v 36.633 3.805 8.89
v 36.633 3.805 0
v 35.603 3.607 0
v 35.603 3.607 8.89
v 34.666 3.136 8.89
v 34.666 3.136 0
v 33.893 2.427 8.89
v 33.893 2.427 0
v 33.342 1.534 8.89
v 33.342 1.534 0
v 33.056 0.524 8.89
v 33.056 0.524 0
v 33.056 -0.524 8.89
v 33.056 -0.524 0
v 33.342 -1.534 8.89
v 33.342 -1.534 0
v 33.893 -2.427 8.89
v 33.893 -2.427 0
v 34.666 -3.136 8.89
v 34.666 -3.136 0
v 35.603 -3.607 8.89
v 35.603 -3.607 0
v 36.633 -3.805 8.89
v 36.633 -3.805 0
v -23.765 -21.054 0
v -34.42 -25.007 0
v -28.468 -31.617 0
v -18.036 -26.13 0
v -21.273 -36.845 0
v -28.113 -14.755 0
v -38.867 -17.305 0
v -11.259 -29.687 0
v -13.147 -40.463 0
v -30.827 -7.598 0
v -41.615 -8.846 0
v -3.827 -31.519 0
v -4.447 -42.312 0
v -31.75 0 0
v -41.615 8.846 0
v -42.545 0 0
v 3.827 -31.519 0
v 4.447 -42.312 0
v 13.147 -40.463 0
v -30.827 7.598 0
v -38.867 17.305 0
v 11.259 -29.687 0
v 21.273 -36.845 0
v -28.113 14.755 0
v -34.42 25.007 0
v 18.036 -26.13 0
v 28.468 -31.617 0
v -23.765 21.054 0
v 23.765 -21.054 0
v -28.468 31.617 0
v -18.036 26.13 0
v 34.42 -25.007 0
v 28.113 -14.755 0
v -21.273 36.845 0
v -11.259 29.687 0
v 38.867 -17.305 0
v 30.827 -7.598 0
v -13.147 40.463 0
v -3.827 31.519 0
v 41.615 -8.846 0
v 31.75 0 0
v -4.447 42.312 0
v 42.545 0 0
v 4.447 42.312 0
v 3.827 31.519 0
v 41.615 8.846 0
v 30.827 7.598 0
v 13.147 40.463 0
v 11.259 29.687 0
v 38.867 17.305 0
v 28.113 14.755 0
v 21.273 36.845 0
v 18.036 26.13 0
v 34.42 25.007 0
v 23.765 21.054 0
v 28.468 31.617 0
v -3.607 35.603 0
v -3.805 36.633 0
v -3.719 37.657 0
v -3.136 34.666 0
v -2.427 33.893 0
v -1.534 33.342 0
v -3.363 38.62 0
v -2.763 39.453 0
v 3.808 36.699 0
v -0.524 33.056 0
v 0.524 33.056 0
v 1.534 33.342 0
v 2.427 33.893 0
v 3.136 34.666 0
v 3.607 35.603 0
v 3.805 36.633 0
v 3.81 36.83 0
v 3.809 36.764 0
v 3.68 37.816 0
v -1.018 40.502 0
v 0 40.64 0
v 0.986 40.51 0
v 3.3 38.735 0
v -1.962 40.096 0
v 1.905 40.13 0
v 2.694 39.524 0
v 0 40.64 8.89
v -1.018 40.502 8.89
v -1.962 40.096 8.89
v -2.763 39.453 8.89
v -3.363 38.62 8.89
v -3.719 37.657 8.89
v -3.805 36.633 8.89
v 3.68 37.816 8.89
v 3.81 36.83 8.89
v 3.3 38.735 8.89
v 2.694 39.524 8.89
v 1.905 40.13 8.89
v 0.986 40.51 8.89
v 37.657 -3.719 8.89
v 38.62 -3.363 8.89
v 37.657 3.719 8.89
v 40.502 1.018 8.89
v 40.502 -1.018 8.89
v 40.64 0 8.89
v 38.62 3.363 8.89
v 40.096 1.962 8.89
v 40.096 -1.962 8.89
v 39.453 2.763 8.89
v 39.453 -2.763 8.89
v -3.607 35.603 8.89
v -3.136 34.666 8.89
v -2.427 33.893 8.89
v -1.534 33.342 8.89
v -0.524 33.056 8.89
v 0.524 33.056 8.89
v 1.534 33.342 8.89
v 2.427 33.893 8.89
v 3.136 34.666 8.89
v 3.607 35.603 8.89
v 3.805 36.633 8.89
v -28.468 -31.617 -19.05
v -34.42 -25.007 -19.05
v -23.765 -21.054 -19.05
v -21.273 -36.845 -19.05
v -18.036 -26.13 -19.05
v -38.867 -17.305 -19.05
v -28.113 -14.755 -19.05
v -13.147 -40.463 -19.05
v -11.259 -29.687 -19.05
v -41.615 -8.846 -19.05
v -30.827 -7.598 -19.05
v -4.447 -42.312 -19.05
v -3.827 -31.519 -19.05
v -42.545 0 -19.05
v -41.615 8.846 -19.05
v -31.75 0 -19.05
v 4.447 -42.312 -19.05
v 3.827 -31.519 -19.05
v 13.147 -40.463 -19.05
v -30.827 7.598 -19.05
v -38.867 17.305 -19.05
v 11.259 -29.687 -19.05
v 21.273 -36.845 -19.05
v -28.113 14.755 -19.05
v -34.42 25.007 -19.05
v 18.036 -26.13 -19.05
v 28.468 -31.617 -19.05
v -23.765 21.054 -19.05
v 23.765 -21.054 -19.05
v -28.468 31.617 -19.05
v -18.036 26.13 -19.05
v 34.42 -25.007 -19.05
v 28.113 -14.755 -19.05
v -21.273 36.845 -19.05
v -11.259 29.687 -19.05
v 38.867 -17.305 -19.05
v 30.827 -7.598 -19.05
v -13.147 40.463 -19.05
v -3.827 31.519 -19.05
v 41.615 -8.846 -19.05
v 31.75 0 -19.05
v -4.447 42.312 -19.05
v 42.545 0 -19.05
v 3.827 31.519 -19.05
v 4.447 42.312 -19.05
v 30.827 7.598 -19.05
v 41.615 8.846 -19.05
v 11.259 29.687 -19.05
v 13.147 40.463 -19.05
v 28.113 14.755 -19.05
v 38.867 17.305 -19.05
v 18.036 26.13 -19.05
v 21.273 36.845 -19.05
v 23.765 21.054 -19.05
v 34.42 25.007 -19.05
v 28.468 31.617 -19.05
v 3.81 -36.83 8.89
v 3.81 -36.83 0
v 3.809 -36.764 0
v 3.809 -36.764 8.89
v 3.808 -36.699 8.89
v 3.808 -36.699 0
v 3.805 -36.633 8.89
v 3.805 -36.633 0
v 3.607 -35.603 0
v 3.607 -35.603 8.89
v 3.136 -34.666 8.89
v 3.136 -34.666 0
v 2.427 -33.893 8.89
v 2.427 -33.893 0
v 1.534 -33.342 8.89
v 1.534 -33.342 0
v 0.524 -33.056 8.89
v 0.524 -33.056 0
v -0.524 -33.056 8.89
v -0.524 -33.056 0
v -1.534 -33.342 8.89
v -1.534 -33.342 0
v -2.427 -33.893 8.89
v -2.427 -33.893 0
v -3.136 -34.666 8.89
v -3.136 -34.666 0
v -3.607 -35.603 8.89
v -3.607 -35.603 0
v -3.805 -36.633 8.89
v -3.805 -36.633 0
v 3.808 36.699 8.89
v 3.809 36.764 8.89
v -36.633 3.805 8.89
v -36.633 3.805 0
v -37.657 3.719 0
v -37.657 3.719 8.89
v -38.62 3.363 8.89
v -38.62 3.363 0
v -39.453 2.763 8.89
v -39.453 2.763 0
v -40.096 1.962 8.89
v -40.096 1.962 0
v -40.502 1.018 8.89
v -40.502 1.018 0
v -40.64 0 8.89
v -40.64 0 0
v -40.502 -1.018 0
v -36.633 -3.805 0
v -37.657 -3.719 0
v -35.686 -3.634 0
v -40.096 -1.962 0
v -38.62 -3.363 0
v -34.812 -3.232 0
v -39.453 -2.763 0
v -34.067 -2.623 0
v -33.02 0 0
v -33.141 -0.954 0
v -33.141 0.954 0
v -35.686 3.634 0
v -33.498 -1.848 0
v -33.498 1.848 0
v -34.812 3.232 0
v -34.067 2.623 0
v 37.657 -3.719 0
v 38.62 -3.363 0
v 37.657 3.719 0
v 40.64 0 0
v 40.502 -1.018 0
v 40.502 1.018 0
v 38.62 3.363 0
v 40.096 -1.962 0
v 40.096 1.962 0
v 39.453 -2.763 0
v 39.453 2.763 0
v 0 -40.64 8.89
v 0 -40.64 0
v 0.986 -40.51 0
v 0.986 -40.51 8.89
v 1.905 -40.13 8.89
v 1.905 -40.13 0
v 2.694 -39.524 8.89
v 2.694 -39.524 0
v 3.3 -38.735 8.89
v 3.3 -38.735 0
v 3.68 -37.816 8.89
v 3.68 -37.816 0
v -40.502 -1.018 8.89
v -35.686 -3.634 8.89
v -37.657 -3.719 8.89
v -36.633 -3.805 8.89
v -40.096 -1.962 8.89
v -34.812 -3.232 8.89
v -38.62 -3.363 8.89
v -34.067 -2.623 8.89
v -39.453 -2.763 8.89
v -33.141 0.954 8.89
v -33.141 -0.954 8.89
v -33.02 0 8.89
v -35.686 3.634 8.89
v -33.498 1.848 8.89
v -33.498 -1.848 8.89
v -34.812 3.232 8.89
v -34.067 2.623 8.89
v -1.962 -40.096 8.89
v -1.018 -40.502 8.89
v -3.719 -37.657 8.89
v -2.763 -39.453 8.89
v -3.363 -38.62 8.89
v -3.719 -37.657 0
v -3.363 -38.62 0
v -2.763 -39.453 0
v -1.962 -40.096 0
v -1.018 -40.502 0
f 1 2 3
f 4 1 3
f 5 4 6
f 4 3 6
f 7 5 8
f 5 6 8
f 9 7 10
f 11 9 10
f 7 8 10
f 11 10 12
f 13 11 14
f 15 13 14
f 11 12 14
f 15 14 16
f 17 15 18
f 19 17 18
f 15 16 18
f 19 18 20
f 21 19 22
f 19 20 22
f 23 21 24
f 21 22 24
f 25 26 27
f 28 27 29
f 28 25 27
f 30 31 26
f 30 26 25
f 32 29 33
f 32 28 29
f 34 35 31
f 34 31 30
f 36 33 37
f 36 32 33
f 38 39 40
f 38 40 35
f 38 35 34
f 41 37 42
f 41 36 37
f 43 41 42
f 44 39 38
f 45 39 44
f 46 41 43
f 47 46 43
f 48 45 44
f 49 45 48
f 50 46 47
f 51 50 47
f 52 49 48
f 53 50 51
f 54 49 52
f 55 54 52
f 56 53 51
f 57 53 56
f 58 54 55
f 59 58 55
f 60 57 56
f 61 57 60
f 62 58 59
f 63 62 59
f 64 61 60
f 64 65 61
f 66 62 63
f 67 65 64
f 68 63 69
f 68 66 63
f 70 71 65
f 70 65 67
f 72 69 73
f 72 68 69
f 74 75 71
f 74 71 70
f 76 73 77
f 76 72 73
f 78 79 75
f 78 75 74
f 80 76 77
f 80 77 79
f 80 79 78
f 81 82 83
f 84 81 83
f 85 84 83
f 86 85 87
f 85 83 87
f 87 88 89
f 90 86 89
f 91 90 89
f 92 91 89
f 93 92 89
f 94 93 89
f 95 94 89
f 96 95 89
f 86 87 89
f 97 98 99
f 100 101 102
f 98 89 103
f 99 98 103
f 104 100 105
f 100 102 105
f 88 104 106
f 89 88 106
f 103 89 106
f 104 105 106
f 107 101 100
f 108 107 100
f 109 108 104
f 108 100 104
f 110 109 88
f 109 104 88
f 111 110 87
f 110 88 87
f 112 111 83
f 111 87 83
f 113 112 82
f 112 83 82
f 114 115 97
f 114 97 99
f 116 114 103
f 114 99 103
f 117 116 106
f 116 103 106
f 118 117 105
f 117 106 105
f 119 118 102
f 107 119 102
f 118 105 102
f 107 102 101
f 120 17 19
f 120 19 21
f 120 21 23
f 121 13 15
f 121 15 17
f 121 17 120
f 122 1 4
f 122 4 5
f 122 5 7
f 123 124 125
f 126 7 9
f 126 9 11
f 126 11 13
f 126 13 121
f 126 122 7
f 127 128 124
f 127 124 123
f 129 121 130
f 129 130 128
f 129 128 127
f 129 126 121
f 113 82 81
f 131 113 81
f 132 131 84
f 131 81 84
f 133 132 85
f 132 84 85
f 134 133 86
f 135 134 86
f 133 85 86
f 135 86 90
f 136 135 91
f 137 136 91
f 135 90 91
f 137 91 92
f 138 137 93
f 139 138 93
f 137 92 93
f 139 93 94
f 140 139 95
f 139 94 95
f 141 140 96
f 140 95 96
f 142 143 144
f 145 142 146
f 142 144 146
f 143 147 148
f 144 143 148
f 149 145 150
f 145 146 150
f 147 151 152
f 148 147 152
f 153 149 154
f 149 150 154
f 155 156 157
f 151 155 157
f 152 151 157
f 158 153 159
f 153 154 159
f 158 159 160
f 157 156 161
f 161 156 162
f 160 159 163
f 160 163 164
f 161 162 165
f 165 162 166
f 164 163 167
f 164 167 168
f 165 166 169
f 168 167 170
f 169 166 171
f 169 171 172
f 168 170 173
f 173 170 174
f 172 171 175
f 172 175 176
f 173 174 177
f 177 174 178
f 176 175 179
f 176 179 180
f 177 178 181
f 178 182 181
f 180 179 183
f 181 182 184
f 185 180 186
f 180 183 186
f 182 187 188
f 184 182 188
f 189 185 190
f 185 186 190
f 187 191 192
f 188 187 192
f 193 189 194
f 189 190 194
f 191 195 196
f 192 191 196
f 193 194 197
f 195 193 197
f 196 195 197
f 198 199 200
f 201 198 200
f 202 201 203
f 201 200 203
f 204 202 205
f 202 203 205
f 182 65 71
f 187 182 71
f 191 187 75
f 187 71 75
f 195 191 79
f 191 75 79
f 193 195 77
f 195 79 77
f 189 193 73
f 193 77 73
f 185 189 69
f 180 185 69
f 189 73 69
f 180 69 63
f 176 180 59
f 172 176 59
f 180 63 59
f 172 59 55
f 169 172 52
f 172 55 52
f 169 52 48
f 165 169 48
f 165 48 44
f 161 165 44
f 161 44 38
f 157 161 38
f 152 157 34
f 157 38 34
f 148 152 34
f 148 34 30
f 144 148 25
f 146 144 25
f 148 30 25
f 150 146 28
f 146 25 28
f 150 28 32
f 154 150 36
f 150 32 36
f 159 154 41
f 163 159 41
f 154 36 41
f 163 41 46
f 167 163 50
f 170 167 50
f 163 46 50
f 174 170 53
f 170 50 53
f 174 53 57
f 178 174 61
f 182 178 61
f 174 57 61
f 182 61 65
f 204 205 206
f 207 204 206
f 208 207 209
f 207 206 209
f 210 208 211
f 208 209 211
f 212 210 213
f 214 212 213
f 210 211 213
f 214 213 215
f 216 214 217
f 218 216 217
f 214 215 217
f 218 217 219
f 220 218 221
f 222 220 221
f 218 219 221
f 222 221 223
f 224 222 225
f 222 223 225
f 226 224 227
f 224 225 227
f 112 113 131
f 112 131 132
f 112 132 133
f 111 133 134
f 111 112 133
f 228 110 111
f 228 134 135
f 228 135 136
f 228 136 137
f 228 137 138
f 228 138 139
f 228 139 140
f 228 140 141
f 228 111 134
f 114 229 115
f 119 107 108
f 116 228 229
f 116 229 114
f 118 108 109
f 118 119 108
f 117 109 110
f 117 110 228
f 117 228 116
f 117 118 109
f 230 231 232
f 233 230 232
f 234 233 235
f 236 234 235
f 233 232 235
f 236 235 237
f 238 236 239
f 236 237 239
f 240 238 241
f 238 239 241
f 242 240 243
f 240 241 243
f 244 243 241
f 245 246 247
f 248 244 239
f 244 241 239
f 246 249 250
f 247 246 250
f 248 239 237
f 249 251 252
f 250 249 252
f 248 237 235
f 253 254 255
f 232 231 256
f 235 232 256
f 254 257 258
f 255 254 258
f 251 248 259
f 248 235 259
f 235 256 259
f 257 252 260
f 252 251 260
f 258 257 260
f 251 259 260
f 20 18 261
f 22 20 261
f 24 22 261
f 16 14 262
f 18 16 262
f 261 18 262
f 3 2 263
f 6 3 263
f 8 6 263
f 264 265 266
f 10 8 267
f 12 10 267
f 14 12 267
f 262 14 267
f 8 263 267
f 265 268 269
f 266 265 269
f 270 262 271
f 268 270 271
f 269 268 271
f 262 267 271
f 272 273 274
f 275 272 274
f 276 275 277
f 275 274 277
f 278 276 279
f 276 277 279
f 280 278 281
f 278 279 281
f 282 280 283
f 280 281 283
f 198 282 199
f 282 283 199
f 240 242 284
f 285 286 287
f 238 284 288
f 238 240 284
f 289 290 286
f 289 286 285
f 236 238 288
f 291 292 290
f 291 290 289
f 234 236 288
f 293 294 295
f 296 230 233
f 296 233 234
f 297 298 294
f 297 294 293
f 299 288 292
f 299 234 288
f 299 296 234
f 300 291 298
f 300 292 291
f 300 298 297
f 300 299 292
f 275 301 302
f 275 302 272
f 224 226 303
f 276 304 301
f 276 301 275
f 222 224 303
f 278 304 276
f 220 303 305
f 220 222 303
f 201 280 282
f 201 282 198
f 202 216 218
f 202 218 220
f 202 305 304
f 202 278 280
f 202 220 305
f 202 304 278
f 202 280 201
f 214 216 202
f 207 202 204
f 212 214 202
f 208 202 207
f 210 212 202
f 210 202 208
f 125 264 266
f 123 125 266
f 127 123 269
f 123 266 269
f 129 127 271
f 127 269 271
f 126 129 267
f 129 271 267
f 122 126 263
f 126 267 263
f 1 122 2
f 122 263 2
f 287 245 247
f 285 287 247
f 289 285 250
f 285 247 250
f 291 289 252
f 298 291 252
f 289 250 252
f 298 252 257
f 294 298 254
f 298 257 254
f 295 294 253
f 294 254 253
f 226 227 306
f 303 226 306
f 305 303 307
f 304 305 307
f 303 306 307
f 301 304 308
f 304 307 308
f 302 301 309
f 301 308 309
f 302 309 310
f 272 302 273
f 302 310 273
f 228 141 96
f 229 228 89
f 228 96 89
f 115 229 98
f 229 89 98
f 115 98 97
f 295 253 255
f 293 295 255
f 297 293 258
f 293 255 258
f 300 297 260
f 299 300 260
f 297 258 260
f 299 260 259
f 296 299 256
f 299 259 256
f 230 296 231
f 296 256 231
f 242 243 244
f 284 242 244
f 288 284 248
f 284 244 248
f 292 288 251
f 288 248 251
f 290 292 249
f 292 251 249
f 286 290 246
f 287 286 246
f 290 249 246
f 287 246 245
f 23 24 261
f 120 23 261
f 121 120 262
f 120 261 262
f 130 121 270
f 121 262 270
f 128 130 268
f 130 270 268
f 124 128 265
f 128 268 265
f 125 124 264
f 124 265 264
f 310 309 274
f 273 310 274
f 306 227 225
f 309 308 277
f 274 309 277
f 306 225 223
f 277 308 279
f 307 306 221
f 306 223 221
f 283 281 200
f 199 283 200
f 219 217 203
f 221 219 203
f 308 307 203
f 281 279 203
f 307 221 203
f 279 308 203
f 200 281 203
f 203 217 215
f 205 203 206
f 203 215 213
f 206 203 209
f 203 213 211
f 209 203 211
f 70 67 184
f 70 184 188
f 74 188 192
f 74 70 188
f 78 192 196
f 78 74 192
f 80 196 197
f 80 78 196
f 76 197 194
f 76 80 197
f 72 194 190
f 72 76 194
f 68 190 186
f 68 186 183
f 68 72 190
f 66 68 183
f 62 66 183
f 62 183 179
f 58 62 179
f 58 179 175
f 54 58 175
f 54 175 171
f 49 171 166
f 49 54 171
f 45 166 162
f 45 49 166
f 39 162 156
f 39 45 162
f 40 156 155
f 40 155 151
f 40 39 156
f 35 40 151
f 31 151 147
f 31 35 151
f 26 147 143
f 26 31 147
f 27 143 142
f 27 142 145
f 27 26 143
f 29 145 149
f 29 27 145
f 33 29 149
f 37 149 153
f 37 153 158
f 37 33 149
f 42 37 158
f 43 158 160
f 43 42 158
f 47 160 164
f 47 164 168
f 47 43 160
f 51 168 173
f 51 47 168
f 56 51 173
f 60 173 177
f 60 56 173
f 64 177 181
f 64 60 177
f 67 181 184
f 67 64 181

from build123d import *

# Parameters (mm, degrees)
F1_DEPTH = 8.89
F0_R     = 42.545
F0_R_2   = 31.75
F2_DEPTH = 19.05


with BuildPart() as f1:
    # F0 (on Top) → F1 (new body)
    with BuildSketch(Plane.XY):
        with BuildLine():
            ThreePointArc((3.81, 36.83), (2.6940768363, 39.5240768363), (0, 40.64))
            ThreePointArc((0, 40.64), (-2.7628728489, 39.4534773909), (-3.8048999754, 36.6329310345))
            ThreePointArc((-3.8048999754, 36.6329310345), (0, 36.83), (3.8048999754, 36.6329310345))
            ThreePointArc((3.8048999754, 36.6329310345), (3.8087247804, 36.7314325264), (3.81, 36.83))
        make_face()
        with BuildLine():
            ThreePointArc((3.8048999754, 36.6329310345), (0, 36.83), (-3.8048999754, 36.6329310345))
            ThreePointArc((-3.8048999754, 36.6329310345), (0, 33.02), (3.8048999754, 36.6329310345))
        make_face()
    extrude(amount=F1_DEPTH)


with BuildPart() as f1b:
    # F0 (on Top) → F1, piece 2 (new body)
    with BuildSketch(Plane.XY):
        with BuildLine():
            ThreePointArc((-33.02, 0), (-34.0671271511, 2.6234773909), (-36.6329310345, 3.8048999754))
            ThreePointArc((-36.6329310345, 3.8048999754), (-36.83, 0), (-36.6329310345, -3.8048999754))
            ThreePointArc((-36.6329310345, -3.8048999754), (-34.0671271511, -2.6234773909), (-33.02, 0))
        make_face()
        with BuildLine():
            ThreePointArc((-36.6329310345, 3.8048999754), (-39.4534773924, 2.7628728475), (-40.64, -4.1e-09))
            ThreePointArc((-40.64, -4.1e-09), (-39.4534773894, -2.7628728503), (-36.6329310345, -3.8048999754))
            ThreePointArc((-36.6329310345, -3.8048999754), (-36.83, 0), (-36.6329310345, 3.8048999754))
        make_face()
    extrude(amount=F1_DEPTH)


with BuildPart() as f1c:
    # F0 (on Top) → F1, piece 3 (new body)
    with BuildSketch(Plane.XY):
        with BuildLine():
            ThreePointArc((36.83, 0), (36.7806997622, 1.905), (36.6329310345, 3.8048999754))
            ThreePointArc((36.6329310345, 3.8048999754), (33.02, 0), (36.6329310345, -3.8048999754))
            ThreePointArc((36.6329310345, -3.8048999754), (36.7806997622, -1.905), (36.83, 0))
        make_face()
        with BuildLine():
            ThreePointArc((36.6329310345, -3.8048999754), (39.4534773909, -2.7628728489), (40.64, 0))
            ThreePointArc((40.64, 0), (39.4534773909, 2.7628728489), (36.6329310345, 3.8048999754))
            ThreePointArc((36.6329310345, 3.8048999754), (36.7806997622, 1.905), (36.83, 0))
            ThreePointArc((36.83, 0), (36.7806997622, -1.905), (36.6329310345, -3.8048999754))
        make_face()
    extrude(amount=F1_DEPTH)


with BuildPart() as f1d:
    # F0 (on Top) → F1, piece 4 (new body)
    with BuildSketch(Plane.XY):
        with BuildLine():
            ThreePointArc((3.8048999754, -36.6329310345), (0, -33.02), (-3.8048999754, -36.6329310345))
            ThreePointArc((-3.8048999754, -36.6329310345), (0, -36.83), (3.8048999754, -36.6329310345))
        make_face()
        with BuildLine():
            ThreePointArc((-3.8048999754, -36.6329310345), (-2.7628728415, -39.4534773987), (2.15e-08, -40.64))
            ThreePointArc((2.15e-08, -40.64), (2.6940768439, -39.5240768287), (3.81, -36.83))
            ThreePointArc((3.81, -36.83), (3.8087247804, -36.7314325264), (3.8048999754, -36.6329310345))
            ThreePointArc((3.8048999754, -36.6329310345), (0, -36.83), (-3.8048999754, -36.6329310345))
        make_face()
    extrude(amount=F1_DEPTH)


with BuildPart() as f2:
    # F0 (on Top) → F2 (new body)
    with BuildSketch(Plane.XY):
        Circle(F0_R)
        with BuildLine():
            ThreePointArc((0, 40.64), (28.7368195874, 28.7368195874), (40.64, 0))
            ThreePointArc((40.64, 0), (28.736819595, -28.7368195798), (2.15e-08, -40.64))
            ThreePointArc((2.15e-08, -40.64), (-28.7368195784, -28.7368195965), (-40.64, -4.1e-09))
            ThreePointArc((-40.64, -4.1e-09), (-28.7368195889, 28.736819586), (0, 40.64))
        make_face(mode=Mode.SUBTRACT)
        with BuildLine():
            ThreePointArc((36.6329310345, -3.8048999754), (33.02, 0), (36.6329310345, 3.8048999754))
            ThreePointArc((36.6329310345, 3.8048999754), (26.0427427511, 26.0427427511), (3.8048999754, 36.6329310345))
            ThreePointArc((3.8048999754, 36.6329310345), (0, 33.02), (-3.8048999754, 36.6329310345))
            ThreePointArc((-3.8048999754, 36.6329310345), (-26.0427427511, 26.0427427511), (-36.6329310345, 3.8048999754))
            ThreePointArc((-36.6329310345, 3.8048999754), (-34.0671271511, 2.6234773909), (-33.02, 0))
            ThreePointArc((-33.02, 0), (-34.0671271511, -2.6234773909), (-36.6329310345, -3.8048999754))
            ThreePointArc((-36.6329310345, -3.8048999754), (-26.0427427511, -26.0427427511), (-3.8048999754, -36.6329310345))
            ThreePointArc((-3.8048999754, -36.6329310345), (0, -33.02), (3.8048999754, -36.6329310345))
            ThreePointArc((3.8048999754, -36.6329310345), (26.0427427511, -26.0427427511), (36.6329310345, -3.8048999754))
        make_face()
        Circle(F0_R_2, mode=Mode.SUBTRACT)
        with BuildLine():
            ThreePointArc((36.6329310345, 3.8048999754), (39.4534773909, 2.7628728489), (40.64, 0))
            ThreePointArc((40.64, 0), (28.7368195874, 28.7368195874), (0, 40.64))
            ThreePointArc((0, 40.64), (2.6940768363, 39.5240768363), (3.81, 36.83))
            ThreePointArc((3.81, 36.83), (3.8087247804, 36.7314325264), (3.8048999754, 36.6329310345))
            ThreePointArc((3.8048999754, 36.6329310345), (26.0427427511, 26.0427427511), (36.6329310345, 3.8048999754))
        make_face()
        with BuildLine():
            ThreePointArc((2.15e-08, -40.64), (28.736819595, -28.7368195798), (40.64, 0))
            ThreePointArc((40.64, 0), (39.4534773909, -2.7628728489), (36.6329310345, -3.8048999754))
            ThreePointArc((36.6329310345, -3.8048999754), (26.0427427511, -26.0427427511), (3.8048999754, -36.6329310345))
            ThreePointArc((3.8048999754, -36.6329310345), (3.8087247804, -36.7314325264), (3.81, -36.83))
            ThreePointArc((3.81, -36.83), (2.6940768439, -39.5240768287), (2.15e-08, -40.64))
        make_face()
        with BuildLine():
            ThreePointArc((-3.8048999754, 36.6329310345), (-2.7628728489, 39.4534773909), (0, 40.64))
            ThreePointArc((0, 40.64), (-28.7368195889, 28.736819586), (-40.64, -4.1e-09))
            ThreePointArc((-40.64, -4.1e-09), (-39.4534773924, 2.7628728475), (-36.6329310345, 3.8048999754))
            ThreePointArc((-36.6329310345, 3.8048999754), (-26.0427427511, 26.0427427511), (-3.8048999754, 36.6329310345))
        make_face()
        with BuildLine():
            ThreePointArc((-40.64, -4.1e-09), (-28.7368195784, -28.7368195965), (2.15e-08, -40.64))
            ThreePointArc((2.15e-08, -40.64), (-2.7628728415, -39.4534773987), (-3.8048999754, -36.6329310345))
            ThreePointArc((-3.8048999754, -36.6329310345), (-26.0427427511, -26.0427427511), (-36.6329310345, -3.8048999754))
            ThreePointArc((-36.6329310345, -3.8048999754), (-39.4534773894, -2.7628728503), (-40.64, -4.1e-09))
        make_face()
        with BuildLine():
            ThreePointArc((36.6329310345, -3.8048999754), (39.4534773909, -2.7628728489), (40.64, 0))
            ThreePointArc((40.64, 0), (39.4534773909, 2.7628728489), (36.6329310345, 3.8048999754))
            ThreePointArc((36.6329310345, 3.8048999754), (36.7806997622, 1.905), (36.83, 0))
            ThreePointArc((36.83, 0), (36.7806997622, -1.905), (36.6329310345, -3.8048999754))
        make_face()
        with BuildLine():
            ThreePointArc((3.81, 36.83), (2.6940768363, 39.5240768363), (0, 40.64))
            ThreePointArc((0, 40.64), (-2.7628728489, 39.4534773909), (-3.8048999754, 36.6329310345))
            ThreePointArc((-3.8048999754, 36.6329310345), (0, 36.83), (3.8048999754, 36.6329310345))
            ThreePointArc((3.8048999754, 36.6329310345), (3.8087247804, 36.7314325264), (3.81, 36.83))
        make_face()
        with BuildLine():
            ThreePointArc((-3.8048999754, -36.6329310345), (-2.7628728415, -39.4534773987), (2.15e-08, -40.64))
            ThreePointArc((2.15e-08, -40.64), (2.6940768439, -39.5240768287), (3.81, -36.83))
            ThreePointArc((3.81, -36.83), (3.8087247804, -36.7314325264), (3.8048999754, -36.6329310345))
            ThreePointArc((3.8048999754, -36.6329310345), (0, -36.83), (-3.8048999754, -36.6329310345))
        make_face()
        with BuildLine():
            ThreePointArc((-36.6329310345, 3.8048999754), (-39.4534773924, 2.7628728475), (-40.64, -4.1e-09))
            ThreePointArc((-40.64, -4.1e-09), (-39.4534773894, -2.7628728503), (-36.6329310345, -3.8048999754))
            ThreePointArc((-36.6329310345, -3.8048999754), (-36.83, 0), (-36.6329310345, 3.8048999754))
        make_face()
        with BuildLine():
            ThreePointArc((36.83, 0), (36.7806997622, 1.905), (36.6329310345, 3.8048999754))
            ThreePointArc((36.6329310345, 3.8048999754), (33.02, 0), (36.6329310345, -3.8048999754))
            ThreePointArc((36.6329310345, -3.8048999754), (36.7806997622, -1.905), (36.83, 0))
        make_face()
        with BuildLine():
            ThreePointArc((3.8048999754, 36.6329310345), (0, 36.83), (-3.8048999754, 36.6329310345))
            ThreePointArc((-3.8048999754, 36.6329310345), (0, 33.02), (3.8048999754, 36.6329310345))
        make_face()
        with BuildLine():
            ThreePointArc((3.8048999754, -36.6329310345), (0, -33.02), (-3.8048999754, -36.6329310345))
            ThreePointArc((-3.8048999754, -36.6329310345), (0, -36.83), (3.8048999754, -36.6329310345))
        make_face()
        with BuildLine():
            ThreePointArc((-33.02, 0), (-34.0671271511, 2.6234773909), (-36.6329310345, 3.8048999754))
            ThreePointArc((-36.6329310345, 3.8048999754), (-36.83, 0), (-36.6329310345, -3.8048999754))
            ThreePointArc((-36.6329310345, -3.8048999754), (-34.0671271511, -2.6234773909), (-33.02, 0))
        make_face()
    extrude(amount=-F2_DEPTH)


solid = Compound([f1.part, f1b.part, f1c.part, f1d.part, f2.part])
